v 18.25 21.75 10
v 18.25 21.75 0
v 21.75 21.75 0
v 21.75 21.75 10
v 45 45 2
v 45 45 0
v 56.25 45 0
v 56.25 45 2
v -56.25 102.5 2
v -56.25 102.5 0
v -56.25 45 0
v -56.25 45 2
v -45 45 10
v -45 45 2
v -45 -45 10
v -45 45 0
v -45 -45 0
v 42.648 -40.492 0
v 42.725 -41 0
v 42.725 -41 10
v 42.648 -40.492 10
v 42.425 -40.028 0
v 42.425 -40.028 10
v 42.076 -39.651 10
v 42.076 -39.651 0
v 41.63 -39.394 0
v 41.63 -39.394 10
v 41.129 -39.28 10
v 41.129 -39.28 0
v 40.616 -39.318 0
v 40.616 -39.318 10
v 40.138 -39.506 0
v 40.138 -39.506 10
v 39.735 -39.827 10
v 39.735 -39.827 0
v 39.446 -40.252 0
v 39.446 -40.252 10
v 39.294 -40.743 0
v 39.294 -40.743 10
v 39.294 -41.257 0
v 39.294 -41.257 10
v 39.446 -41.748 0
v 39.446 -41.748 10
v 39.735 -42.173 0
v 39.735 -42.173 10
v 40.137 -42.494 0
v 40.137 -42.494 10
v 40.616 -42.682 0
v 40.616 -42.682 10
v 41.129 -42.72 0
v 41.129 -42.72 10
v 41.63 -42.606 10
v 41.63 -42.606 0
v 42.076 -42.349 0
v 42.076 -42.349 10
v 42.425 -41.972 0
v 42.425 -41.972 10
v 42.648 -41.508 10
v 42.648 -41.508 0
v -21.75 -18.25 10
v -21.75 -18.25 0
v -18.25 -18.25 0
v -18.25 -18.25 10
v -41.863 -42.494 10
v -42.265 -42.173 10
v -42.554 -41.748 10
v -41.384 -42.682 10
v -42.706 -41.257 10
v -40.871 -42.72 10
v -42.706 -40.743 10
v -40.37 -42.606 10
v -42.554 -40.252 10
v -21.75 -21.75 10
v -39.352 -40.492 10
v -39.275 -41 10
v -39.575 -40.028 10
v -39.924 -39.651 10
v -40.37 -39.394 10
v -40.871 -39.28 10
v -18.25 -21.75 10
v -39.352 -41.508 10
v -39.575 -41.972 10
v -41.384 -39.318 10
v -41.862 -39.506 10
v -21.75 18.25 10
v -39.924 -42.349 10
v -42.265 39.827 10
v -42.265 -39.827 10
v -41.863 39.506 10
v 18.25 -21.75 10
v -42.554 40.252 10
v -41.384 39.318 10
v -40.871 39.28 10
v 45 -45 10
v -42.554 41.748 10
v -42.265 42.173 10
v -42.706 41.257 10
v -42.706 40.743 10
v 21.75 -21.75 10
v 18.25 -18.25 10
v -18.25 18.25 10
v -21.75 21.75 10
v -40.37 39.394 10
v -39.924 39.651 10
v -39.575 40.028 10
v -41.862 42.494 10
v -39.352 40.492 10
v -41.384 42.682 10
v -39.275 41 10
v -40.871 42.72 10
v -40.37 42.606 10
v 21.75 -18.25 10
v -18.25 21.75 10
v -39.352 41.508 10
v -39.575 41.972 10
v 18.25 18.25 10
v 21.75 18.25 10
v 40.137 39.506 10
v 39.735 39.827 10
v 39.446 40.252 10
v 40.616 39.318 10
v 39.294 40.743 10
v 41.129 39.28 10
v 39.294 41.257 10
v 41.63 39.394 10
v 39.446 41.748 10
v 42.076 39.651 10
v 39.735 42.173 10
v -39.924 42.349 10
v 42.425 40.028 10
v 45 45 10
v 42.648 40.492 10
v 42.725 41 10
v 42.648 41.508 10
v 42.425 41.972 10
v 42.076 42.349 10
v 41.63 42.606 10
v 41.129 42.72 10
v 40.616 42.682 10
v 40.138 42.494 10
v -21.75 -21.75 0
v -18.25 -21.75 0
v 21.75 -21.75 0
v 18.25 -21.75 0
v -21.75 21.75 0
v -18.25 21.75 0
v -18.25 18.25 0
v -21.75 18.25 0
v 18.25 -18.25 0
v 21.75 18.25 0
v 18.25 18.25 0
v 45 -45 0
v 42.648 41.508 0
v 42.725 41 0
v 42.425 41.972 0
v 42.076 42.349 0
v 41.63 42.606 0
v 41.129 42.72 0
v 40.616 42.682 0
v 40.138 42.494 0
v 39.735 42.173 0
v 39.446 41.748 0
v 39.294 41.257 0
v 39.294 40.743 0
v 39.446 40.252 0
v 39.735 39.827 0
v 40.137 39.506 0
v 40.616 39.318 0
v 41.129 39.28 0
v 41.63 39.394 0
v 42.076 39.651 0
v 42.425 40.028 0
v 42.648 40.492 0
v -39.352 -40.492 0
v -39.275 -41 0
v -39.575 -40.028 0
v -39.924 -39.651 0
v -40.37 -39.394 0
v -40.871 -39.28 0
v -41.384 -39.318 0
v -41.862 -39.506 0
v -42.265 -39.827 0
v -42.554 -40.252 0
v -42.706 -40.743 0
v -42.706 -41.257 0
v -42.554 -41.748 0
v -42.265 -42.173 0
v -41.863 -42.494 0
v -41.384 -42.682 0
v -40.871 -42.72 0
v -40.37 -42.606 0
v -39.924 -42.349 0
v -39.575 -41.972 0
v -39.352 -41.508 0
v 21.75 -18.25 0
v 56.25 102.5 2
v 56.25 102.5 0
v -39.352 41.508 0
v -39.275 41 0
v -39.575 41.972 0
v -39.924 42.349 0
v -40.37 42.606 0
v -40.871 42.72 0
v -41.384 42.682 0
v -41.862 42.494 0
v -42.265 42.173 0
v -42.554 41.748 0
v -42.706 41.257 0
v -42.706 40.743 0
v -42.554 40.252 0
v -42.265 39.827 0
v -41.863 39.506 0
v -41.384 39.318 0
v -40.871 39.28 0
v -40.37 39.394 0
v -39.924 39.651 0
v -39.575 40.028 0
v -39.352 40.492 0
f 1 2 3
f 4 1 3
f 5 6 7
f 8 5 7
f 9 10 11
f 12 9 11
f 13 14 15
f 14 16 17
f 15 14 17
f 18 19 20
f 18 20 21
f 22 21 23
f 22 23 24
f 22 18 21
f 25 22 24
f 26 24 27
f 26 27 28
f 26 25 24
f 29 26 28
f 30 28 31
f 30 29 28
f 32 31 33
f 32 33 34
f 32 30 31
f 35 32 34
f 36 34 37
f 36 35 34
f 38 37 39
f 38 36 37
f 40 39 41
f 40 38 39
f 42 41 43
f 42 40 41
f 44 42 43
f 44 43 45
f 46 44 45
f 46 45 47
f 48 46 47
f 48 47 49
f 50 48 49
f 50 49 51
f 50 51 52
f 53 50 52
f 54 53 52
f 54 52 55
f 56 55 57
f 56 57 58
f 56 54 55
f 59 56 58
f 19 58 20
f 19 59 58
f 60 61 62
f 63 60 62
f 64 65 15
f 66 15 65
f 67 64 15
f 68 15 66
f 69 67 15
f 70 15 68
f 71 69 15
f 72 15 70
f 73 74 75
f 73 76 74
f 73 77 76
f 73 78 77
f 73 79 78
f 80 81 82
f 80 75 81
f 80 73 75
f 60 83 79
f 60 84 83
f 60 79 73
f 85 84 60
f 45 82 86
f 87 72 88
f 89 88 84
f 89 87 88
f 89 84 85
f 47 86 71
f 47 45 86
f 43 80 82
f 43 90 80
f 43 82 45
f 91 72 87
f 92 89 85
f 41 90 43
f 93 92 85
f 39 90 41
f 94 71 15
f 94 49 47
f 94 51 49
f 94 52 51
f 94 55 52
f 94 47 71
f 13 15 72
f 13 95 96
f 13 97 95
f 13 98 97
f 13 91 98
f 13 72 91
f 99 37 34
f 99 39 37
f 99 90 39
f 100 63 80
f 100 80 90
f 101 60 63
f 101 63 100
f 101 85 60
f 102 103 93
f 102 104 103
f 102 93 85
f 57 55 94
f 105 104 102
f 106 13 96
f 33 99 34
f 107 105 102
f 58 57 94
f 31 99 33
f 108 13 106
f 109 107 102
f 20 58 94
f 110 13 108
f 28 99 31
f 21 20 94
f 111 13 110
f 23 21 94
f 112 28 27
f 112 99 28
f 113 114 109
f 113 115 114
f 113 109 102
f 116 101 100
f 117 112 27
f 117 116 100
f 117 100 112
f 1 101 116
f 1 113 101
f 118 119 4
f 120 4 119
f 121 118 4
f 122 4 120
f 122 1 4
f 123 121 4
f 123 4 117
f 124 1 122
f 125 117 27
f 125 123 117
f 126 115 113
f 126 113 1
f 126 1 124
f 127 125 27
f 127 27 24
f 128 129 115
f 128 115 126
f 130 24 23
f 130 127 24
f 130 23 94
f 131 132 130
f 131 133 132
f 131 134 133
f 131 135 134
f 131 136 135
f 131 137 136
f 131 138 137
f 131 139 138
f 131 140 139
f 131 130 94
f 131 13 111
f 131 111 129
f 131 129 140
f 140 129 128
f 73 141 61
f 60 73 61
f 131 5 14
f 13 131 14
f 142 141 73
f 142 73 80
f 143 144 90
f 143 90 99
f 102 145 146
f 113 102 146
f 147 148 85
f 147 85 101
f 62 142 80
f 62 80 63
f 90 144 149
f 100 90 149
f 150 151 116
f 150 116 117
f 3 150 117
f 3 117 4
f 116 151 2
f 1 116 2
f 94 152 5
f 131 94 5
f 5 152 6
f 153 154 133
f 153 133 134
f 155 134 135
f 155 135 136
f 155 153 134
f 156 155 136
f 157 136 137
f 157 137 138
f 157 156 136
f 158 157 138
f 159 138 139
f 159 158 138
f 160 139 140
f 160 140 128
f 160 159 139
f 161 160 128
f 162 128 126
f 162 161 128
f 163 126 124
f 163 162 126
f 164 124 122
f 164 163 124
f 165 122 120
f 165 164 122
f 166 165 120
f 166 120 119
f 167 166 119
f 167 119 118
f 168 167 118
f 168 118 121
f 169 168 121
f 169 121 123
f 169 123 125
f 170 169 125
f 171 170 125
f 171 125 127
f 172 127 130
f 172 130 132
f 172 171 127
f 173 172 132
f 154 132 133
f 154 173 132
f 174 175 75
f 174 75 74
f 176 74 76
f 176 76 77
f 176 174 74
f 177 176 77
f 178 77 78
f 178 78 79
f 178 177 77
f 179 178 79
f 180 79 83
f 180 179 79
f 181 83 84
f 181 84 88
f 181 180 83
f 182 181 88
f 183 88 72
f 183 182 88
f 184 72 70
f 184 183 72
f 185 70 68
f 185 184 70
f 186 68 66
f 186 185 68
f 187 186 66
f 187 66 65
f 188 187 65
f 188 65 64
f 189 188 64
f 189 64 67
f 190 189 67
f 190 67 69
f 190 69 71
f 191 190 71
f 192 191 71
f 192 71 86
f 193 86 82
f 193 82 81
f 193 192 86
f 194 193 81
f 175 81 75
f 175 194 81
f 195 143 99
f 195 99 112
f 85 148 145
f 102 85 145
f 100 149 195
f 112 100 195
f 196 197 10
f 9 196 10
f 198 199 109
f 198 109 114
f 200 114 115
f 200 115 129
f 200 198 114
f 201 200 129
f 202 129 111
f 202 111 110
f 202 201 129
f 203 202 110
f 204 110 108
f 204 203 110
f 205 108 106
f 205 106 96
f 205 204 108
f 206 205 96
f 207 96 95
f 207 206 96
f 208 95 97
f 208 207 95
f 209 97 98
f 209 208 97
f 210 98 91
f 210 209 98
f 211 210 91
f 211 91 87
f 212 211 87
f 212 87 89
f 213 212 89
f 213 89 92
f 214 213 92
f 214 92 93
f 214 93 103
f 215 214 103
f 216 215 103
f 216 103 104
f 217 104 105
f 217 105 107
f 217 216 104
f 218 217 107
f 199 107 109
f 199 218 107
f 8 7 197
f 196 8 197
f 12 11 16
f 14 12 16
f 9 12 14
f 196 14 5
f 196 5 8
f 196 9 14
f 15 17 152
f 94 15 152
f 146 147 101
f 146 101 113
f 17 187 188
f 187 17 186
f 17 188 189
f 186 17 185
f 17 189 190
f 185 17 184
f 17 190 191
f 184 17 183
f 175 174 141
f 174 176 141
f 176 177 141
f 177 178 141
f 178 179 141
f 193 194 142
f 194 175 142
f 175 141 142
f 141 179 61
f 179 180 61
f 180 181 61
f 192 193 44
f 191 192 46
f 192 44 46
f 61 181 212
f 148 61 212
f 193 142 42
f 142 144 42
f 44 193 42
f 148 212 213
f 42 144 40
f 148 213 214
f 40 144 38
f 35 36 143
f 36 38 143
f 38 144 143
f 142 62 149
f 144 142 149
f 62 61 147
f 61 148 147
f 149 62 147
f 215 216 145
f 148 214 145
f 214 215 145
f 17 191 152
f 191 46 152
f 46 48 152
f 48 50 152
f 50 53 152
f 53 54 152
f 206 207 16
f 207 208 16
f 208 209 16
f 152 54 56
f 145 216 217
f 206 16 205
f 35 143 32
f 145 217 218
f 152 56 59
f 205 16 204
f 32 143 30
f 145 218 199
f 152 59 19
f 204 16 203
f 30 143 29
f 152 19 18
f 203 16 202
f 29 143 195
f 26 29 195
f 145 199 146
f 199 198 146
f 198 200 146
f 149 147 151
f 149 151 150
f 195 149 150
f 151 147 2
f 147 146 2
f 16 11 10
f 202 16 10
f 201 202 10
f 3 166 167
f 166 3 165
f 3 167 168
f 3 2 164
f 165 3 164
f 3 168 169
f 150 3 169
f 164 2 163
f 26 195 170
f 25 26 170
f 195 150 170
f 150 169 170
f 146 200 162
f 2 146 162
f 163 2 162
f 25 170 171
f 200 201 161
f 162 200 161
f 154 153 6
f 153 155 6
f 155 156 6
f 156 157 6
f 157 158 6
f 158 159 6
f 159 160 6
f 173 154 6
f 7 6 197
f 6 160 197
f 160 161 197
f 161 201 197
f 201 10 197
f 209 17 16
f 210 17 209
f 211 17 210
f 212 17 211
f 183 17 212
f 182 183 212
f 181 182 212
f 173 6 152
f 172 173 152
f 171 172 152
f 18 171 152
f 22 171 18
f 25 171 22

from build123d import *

# Parameters (mm, degrees)
F0_R     = 1.725
F0_W     = 3.5
F0_H     = 3.5
F1_DEPTH = 10
F3_DEPTH = 2


with BuildPart() as f1:
    # F0 (on Top) → F1 (new body)
    with BuildSketch(Plane.XY):
        Polygon((45, -45), (45, 0), (45, 45), (0, 45), (-45, 45), (-45, 0), (-45, -45), (0, -45), align=None)
        with Locations((-41, -41)):
            Circle(F0_R, mode=Mode.SUBTRACT)
        with Locations((-20, -20)):
            Rectangle(F0_W, F0_H, mode=Mode.SUBTRACT)
        with Locations((41, -41)):
            Circle(F0_R, mode=Mode.SUBTRACT)
        with Locations((20, -20)):
            Rectangle(F0_W, F0_H, mode=Mode.SUBTRACT)
        with Locations((-20, 20)):
            Rectangle(F0_W, F0_H, mode=Mode.SUBTRACT)
        with Locations((-41, 41)):
            Circle(F0_R, mode=Mode.SUBTRACT)
        with Locations((20, 20)):
            Rectangle(F0_W, F0_H, mode=Mode.SUBTRACT)
        with Locations((41, 41)):
            Circle(F0_R, mode=Mode.SUBTRACT)
    extrude(amount=F1_DEPTH)

    # F2 (on Top) → F3 (join)
    with BuildSketch(Plane.XY):
        Polygon((45, 102.5), (-45, 102.5), (-56.25, 102.5), (-56.25, 45), (56.25, 45), (56.25, 102.5), align=None)
    extrude(amount=F3_DEPTH)


solid = f1.part
